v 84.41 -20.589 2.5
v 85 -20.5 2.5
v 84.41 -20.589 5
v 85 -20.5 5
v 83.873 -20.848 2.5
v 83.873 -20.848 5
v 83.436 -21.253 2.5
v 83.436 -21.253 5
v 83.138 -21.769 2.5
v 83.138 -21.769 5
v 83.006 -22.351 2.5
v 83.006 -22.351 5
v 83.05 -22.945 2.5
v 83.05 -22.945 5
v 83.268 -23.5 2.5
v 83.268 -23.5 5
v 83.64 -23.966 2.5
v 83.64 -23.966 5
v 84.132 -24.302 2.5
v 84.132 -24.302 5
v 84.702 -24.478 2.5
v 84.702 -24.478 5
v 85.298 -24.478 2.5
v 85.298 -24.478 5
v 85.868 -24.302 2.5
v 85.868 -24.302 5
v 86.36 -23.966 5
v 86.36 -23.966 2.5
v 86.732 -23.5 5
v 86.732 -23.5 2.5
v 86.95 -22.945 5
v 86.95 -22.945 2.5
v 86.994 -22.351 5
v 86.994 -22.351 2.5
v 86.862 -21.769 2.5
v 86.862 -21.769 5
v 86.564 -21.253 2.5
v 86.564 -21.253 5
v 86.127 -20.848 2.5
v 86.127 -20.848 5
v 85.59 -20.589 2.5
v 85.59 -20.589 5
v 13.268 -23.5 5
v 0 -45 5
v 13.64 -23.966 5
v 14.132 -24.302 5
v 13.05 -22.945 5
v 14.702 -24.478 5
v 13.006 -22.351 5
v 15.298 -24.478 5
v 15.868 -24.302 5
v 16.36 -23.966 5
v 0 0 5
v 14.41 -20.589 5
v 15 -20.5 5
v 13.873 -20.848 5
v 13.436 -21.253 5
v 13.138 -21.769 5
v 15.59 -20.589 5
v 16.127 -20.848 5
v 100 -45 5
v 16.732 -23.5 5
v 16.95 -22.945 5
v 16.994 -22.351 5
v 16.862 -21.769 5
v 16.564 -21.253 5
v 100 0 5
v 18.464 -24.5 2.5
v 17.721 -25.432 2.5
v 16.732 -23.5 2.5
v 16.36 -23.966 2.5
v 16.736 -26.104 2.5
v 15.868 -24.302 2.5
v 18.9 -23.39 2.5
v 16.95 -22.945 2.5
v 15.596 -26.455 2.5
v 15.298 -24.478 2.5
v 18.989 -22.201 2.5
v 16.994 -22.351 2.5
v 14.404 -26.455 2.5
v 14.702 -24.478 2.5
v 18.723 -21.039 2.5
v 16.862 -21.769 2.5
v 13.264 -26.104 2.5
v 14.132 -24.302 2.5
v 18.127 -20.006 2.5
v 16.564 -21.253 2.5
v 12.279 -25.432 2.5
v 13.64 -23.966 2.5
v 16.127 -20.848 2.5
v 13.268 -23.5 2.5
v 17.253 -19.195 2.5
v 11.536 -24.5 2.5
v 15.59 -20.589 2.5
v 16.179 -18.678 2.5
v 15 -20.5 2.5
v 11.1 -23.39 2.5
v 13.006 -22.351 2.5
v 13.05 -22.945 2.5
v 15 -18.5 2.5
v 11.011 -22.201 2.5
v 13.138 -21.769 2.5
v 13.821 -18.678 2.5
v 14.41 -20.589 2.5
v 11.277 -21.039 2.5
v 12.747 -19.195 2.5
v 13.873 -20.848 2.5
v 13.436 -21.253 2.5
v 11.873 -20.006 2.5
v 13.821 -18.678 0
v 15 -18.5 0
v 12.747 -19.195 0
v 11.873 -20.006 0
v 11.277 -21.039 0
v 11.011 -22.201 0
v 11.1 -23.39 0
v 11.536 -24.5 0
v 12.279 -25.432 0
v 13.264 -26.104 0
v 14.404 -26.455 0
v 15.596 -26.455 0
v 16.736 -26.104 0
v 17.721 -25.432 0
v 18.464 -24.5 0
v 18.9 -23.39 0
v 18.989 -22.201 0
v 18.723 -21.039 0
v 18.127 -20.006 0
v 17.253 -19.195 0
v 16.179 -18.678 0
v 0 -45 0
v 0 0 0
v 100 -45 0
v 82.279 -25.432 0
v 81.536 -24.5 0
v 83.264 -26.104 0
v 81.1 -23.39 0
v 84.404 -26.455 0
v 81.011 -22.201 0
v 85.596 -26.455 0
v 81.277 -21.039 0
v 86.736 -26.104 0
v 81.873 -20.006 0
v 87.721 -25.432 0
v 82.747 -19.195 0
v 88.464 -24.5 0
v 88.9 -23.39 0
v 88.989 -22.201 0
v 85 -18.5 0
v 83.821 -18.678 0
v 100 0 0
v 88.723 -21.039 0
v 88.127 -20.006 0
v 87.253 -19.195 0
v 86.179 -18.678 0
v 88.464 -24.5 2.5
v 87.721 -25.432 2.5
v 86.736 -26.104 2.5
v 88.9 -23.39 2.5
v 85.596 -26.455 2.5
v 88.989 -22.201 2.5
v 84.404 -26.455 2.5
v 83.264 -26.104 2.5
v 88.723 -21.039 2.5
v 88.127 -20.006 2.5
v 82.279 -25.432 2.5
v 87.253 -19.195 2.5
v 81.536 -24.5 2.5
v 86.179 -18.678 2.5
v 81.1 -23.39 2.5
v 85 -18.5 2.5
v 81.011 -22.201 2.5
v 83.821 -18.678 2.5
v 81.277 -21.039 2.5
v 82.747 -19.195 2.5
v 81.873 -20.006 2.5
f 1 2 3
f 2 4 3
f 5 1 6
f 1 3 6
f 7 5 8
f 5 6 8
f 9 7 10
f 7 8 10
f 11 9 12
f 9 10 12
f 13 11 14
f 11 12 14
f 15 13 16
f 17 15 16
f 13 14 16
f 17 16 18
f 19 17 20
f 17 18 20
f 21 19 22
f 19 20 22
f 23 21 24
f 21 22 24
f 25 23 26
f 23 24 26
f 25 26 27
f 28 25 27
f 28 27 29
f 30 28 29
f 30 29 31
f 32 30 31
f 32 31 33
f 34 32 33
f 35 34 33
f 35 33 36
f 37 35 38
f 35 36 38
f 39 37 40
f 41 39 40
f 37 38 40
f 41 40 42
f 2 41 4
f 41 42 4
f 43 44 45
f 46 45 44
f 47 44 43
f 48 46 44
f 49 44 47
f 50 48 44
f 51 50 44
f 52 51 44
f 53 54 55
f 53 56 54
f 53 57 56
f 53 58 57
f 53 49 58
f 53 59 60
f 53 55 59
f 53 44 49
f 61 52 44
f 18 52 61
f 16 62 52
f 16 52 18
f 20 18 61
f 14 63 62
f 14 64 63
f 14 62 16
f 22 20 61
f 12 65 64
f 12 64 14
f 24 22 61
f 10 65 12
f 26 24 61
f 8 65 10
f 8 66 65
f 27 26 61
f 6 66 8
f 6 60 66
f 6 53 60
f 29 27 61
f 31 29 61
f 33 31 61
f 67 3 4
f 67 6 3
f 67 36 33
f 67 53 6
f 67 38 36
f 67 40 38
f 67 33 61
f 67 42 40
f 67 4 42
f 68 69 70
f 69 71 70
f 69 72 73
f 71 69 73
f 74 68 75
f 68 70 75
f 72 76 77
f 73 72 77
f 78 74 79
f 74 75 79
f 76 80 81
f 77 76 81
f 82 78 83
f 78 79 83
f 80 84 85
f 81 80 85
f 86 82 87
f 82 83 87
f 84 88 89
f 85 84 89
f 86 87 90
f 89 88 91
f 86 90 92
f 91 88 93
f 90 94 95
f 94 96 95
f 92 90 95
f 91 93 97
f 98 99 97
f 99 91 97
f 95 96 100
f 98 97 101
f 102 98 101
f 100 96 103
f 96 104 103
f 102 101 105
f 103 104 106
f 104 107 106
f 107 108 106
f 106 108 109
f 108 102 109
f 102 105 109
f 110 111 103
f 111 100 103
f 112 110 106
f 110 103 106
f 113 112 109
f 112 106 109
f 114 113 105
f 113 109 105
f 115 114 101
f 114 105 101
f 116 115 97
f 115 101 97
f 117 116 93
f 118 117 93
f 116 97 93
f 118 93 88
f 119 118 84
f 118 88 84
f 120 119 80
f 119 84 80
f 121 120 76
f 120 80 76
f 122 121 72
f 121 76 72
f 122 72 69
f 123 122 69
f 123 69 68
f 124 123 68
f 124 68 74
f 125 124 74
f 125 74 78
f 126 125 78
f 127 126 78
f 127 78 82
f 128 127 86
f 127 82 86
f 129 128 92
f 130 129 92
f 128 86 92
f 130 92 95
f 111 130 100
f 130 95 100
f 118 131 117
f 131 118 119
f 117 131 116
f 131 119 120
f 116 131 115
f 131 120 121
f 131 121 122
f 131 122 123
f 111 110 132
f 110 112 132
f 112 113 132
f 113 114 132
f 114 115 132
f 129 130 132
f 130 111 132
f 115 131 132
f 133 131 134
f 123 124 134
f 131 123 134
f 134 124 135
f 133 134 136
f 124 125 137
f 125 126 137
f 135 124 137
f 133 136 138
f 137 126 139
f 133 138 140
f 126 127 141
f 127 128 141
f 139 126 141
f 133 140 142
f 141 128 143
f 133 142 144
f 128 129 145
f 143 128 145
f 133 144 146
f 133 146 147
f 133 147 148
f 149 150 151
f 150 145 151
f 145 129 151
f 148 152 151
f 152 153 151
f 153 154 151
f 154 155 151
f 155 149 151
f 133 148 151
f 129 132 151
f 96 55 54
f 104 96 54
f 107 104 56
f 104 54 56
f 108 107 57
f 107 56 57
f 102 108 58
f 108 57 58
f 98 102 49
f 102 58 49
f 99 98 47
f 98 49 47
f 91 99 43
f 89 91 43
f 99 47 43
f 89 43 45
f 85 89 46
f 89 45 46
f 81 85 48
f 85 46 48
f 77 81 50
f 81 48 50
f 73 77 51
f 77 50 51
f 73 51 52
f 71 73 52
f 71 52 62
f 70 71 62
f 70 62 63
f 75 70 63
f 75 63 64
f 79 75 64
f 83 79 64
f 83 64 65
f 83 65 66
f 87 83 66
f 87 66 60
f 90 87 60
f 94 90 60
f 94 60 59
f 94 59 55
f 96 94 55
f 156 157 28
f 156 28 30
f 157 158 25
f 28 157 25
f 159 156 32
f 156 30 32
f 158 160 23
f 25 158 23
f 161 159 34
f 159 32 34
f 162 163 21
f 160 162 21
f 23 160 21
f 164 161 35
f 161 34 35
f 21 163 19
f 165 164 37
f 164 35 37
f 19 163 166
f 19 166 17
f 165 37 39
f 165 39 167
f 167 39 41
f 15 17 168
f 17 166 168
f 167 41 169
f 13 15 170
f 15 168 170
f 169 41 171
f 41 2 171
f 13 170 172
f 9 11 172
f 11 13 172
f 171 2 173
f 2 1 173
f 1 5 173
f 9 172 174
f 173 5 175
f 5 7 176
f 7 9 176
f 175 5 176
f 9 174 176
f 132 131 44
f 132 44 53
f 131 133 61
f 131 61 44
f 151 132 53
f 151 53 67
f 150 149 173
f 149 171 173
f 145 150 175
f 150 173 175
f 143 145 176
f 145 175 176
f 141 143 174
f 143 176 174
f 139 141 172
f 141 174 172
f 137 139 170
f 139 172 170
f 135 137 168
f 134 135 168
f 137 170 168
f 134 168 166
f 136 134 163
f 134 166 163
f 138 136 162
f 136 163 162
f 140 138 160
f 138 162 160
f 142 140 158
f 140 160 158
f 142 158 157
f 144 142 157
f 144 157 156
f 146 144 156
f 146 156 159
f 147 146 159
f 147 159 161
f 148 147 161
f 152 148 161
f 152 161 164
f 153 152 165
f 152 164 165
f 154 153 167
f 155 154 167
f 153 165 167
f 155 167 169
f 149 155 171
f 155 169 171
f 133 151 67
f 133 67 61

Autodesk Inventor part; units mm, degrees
ref_plane "YZ Plane" through (0, 0, 0) normal (1, 0, 0) x (0, 1, 0)
ref_plane "XZ Plane" through (0, 0, 0) normal (0, 1, 0) x (-1, 0, 0)
ref_plane "XY Plane" through (0, 0, 0) normal (0, 0, 1) x (1, 0, 0)
sketch "Sketch1" plane through (0, 0, 0) normal (0, 0, 1) x (1, 0, 0)
  line L0 (0, 0) -> (100, 0)
  line L1 (100, 0) -> (100, -45)
  line L2 (100, -45) -> (0, -45)
  line L3 (0, -45) -> (0, 0)
  dimension "d0" = 100
  dimension "d1" = 45
extrude "Extrusion1" add sketch "Sketch1" along normal blind 5
sketch "Sketch2" plane through (0, 0, 0) normal (0, 0, -1) x (-1, 0, 0)
  point P0 (0, 0)
  point P1 (-15, -22.5)
  point P2 (-85, -22.5)
  dimension "d4" = 70
  dimension "d5" = 15
  dimension "d6" = 22.5
hole "Hole1" at (15, -22.5, 0) at (85, -22.5, 0) direction (0, 0, 1) diameter 4 depth 5 tip angle 118 counterbore diameter 8 counterbore depth 2.5
properties part number "as3"
